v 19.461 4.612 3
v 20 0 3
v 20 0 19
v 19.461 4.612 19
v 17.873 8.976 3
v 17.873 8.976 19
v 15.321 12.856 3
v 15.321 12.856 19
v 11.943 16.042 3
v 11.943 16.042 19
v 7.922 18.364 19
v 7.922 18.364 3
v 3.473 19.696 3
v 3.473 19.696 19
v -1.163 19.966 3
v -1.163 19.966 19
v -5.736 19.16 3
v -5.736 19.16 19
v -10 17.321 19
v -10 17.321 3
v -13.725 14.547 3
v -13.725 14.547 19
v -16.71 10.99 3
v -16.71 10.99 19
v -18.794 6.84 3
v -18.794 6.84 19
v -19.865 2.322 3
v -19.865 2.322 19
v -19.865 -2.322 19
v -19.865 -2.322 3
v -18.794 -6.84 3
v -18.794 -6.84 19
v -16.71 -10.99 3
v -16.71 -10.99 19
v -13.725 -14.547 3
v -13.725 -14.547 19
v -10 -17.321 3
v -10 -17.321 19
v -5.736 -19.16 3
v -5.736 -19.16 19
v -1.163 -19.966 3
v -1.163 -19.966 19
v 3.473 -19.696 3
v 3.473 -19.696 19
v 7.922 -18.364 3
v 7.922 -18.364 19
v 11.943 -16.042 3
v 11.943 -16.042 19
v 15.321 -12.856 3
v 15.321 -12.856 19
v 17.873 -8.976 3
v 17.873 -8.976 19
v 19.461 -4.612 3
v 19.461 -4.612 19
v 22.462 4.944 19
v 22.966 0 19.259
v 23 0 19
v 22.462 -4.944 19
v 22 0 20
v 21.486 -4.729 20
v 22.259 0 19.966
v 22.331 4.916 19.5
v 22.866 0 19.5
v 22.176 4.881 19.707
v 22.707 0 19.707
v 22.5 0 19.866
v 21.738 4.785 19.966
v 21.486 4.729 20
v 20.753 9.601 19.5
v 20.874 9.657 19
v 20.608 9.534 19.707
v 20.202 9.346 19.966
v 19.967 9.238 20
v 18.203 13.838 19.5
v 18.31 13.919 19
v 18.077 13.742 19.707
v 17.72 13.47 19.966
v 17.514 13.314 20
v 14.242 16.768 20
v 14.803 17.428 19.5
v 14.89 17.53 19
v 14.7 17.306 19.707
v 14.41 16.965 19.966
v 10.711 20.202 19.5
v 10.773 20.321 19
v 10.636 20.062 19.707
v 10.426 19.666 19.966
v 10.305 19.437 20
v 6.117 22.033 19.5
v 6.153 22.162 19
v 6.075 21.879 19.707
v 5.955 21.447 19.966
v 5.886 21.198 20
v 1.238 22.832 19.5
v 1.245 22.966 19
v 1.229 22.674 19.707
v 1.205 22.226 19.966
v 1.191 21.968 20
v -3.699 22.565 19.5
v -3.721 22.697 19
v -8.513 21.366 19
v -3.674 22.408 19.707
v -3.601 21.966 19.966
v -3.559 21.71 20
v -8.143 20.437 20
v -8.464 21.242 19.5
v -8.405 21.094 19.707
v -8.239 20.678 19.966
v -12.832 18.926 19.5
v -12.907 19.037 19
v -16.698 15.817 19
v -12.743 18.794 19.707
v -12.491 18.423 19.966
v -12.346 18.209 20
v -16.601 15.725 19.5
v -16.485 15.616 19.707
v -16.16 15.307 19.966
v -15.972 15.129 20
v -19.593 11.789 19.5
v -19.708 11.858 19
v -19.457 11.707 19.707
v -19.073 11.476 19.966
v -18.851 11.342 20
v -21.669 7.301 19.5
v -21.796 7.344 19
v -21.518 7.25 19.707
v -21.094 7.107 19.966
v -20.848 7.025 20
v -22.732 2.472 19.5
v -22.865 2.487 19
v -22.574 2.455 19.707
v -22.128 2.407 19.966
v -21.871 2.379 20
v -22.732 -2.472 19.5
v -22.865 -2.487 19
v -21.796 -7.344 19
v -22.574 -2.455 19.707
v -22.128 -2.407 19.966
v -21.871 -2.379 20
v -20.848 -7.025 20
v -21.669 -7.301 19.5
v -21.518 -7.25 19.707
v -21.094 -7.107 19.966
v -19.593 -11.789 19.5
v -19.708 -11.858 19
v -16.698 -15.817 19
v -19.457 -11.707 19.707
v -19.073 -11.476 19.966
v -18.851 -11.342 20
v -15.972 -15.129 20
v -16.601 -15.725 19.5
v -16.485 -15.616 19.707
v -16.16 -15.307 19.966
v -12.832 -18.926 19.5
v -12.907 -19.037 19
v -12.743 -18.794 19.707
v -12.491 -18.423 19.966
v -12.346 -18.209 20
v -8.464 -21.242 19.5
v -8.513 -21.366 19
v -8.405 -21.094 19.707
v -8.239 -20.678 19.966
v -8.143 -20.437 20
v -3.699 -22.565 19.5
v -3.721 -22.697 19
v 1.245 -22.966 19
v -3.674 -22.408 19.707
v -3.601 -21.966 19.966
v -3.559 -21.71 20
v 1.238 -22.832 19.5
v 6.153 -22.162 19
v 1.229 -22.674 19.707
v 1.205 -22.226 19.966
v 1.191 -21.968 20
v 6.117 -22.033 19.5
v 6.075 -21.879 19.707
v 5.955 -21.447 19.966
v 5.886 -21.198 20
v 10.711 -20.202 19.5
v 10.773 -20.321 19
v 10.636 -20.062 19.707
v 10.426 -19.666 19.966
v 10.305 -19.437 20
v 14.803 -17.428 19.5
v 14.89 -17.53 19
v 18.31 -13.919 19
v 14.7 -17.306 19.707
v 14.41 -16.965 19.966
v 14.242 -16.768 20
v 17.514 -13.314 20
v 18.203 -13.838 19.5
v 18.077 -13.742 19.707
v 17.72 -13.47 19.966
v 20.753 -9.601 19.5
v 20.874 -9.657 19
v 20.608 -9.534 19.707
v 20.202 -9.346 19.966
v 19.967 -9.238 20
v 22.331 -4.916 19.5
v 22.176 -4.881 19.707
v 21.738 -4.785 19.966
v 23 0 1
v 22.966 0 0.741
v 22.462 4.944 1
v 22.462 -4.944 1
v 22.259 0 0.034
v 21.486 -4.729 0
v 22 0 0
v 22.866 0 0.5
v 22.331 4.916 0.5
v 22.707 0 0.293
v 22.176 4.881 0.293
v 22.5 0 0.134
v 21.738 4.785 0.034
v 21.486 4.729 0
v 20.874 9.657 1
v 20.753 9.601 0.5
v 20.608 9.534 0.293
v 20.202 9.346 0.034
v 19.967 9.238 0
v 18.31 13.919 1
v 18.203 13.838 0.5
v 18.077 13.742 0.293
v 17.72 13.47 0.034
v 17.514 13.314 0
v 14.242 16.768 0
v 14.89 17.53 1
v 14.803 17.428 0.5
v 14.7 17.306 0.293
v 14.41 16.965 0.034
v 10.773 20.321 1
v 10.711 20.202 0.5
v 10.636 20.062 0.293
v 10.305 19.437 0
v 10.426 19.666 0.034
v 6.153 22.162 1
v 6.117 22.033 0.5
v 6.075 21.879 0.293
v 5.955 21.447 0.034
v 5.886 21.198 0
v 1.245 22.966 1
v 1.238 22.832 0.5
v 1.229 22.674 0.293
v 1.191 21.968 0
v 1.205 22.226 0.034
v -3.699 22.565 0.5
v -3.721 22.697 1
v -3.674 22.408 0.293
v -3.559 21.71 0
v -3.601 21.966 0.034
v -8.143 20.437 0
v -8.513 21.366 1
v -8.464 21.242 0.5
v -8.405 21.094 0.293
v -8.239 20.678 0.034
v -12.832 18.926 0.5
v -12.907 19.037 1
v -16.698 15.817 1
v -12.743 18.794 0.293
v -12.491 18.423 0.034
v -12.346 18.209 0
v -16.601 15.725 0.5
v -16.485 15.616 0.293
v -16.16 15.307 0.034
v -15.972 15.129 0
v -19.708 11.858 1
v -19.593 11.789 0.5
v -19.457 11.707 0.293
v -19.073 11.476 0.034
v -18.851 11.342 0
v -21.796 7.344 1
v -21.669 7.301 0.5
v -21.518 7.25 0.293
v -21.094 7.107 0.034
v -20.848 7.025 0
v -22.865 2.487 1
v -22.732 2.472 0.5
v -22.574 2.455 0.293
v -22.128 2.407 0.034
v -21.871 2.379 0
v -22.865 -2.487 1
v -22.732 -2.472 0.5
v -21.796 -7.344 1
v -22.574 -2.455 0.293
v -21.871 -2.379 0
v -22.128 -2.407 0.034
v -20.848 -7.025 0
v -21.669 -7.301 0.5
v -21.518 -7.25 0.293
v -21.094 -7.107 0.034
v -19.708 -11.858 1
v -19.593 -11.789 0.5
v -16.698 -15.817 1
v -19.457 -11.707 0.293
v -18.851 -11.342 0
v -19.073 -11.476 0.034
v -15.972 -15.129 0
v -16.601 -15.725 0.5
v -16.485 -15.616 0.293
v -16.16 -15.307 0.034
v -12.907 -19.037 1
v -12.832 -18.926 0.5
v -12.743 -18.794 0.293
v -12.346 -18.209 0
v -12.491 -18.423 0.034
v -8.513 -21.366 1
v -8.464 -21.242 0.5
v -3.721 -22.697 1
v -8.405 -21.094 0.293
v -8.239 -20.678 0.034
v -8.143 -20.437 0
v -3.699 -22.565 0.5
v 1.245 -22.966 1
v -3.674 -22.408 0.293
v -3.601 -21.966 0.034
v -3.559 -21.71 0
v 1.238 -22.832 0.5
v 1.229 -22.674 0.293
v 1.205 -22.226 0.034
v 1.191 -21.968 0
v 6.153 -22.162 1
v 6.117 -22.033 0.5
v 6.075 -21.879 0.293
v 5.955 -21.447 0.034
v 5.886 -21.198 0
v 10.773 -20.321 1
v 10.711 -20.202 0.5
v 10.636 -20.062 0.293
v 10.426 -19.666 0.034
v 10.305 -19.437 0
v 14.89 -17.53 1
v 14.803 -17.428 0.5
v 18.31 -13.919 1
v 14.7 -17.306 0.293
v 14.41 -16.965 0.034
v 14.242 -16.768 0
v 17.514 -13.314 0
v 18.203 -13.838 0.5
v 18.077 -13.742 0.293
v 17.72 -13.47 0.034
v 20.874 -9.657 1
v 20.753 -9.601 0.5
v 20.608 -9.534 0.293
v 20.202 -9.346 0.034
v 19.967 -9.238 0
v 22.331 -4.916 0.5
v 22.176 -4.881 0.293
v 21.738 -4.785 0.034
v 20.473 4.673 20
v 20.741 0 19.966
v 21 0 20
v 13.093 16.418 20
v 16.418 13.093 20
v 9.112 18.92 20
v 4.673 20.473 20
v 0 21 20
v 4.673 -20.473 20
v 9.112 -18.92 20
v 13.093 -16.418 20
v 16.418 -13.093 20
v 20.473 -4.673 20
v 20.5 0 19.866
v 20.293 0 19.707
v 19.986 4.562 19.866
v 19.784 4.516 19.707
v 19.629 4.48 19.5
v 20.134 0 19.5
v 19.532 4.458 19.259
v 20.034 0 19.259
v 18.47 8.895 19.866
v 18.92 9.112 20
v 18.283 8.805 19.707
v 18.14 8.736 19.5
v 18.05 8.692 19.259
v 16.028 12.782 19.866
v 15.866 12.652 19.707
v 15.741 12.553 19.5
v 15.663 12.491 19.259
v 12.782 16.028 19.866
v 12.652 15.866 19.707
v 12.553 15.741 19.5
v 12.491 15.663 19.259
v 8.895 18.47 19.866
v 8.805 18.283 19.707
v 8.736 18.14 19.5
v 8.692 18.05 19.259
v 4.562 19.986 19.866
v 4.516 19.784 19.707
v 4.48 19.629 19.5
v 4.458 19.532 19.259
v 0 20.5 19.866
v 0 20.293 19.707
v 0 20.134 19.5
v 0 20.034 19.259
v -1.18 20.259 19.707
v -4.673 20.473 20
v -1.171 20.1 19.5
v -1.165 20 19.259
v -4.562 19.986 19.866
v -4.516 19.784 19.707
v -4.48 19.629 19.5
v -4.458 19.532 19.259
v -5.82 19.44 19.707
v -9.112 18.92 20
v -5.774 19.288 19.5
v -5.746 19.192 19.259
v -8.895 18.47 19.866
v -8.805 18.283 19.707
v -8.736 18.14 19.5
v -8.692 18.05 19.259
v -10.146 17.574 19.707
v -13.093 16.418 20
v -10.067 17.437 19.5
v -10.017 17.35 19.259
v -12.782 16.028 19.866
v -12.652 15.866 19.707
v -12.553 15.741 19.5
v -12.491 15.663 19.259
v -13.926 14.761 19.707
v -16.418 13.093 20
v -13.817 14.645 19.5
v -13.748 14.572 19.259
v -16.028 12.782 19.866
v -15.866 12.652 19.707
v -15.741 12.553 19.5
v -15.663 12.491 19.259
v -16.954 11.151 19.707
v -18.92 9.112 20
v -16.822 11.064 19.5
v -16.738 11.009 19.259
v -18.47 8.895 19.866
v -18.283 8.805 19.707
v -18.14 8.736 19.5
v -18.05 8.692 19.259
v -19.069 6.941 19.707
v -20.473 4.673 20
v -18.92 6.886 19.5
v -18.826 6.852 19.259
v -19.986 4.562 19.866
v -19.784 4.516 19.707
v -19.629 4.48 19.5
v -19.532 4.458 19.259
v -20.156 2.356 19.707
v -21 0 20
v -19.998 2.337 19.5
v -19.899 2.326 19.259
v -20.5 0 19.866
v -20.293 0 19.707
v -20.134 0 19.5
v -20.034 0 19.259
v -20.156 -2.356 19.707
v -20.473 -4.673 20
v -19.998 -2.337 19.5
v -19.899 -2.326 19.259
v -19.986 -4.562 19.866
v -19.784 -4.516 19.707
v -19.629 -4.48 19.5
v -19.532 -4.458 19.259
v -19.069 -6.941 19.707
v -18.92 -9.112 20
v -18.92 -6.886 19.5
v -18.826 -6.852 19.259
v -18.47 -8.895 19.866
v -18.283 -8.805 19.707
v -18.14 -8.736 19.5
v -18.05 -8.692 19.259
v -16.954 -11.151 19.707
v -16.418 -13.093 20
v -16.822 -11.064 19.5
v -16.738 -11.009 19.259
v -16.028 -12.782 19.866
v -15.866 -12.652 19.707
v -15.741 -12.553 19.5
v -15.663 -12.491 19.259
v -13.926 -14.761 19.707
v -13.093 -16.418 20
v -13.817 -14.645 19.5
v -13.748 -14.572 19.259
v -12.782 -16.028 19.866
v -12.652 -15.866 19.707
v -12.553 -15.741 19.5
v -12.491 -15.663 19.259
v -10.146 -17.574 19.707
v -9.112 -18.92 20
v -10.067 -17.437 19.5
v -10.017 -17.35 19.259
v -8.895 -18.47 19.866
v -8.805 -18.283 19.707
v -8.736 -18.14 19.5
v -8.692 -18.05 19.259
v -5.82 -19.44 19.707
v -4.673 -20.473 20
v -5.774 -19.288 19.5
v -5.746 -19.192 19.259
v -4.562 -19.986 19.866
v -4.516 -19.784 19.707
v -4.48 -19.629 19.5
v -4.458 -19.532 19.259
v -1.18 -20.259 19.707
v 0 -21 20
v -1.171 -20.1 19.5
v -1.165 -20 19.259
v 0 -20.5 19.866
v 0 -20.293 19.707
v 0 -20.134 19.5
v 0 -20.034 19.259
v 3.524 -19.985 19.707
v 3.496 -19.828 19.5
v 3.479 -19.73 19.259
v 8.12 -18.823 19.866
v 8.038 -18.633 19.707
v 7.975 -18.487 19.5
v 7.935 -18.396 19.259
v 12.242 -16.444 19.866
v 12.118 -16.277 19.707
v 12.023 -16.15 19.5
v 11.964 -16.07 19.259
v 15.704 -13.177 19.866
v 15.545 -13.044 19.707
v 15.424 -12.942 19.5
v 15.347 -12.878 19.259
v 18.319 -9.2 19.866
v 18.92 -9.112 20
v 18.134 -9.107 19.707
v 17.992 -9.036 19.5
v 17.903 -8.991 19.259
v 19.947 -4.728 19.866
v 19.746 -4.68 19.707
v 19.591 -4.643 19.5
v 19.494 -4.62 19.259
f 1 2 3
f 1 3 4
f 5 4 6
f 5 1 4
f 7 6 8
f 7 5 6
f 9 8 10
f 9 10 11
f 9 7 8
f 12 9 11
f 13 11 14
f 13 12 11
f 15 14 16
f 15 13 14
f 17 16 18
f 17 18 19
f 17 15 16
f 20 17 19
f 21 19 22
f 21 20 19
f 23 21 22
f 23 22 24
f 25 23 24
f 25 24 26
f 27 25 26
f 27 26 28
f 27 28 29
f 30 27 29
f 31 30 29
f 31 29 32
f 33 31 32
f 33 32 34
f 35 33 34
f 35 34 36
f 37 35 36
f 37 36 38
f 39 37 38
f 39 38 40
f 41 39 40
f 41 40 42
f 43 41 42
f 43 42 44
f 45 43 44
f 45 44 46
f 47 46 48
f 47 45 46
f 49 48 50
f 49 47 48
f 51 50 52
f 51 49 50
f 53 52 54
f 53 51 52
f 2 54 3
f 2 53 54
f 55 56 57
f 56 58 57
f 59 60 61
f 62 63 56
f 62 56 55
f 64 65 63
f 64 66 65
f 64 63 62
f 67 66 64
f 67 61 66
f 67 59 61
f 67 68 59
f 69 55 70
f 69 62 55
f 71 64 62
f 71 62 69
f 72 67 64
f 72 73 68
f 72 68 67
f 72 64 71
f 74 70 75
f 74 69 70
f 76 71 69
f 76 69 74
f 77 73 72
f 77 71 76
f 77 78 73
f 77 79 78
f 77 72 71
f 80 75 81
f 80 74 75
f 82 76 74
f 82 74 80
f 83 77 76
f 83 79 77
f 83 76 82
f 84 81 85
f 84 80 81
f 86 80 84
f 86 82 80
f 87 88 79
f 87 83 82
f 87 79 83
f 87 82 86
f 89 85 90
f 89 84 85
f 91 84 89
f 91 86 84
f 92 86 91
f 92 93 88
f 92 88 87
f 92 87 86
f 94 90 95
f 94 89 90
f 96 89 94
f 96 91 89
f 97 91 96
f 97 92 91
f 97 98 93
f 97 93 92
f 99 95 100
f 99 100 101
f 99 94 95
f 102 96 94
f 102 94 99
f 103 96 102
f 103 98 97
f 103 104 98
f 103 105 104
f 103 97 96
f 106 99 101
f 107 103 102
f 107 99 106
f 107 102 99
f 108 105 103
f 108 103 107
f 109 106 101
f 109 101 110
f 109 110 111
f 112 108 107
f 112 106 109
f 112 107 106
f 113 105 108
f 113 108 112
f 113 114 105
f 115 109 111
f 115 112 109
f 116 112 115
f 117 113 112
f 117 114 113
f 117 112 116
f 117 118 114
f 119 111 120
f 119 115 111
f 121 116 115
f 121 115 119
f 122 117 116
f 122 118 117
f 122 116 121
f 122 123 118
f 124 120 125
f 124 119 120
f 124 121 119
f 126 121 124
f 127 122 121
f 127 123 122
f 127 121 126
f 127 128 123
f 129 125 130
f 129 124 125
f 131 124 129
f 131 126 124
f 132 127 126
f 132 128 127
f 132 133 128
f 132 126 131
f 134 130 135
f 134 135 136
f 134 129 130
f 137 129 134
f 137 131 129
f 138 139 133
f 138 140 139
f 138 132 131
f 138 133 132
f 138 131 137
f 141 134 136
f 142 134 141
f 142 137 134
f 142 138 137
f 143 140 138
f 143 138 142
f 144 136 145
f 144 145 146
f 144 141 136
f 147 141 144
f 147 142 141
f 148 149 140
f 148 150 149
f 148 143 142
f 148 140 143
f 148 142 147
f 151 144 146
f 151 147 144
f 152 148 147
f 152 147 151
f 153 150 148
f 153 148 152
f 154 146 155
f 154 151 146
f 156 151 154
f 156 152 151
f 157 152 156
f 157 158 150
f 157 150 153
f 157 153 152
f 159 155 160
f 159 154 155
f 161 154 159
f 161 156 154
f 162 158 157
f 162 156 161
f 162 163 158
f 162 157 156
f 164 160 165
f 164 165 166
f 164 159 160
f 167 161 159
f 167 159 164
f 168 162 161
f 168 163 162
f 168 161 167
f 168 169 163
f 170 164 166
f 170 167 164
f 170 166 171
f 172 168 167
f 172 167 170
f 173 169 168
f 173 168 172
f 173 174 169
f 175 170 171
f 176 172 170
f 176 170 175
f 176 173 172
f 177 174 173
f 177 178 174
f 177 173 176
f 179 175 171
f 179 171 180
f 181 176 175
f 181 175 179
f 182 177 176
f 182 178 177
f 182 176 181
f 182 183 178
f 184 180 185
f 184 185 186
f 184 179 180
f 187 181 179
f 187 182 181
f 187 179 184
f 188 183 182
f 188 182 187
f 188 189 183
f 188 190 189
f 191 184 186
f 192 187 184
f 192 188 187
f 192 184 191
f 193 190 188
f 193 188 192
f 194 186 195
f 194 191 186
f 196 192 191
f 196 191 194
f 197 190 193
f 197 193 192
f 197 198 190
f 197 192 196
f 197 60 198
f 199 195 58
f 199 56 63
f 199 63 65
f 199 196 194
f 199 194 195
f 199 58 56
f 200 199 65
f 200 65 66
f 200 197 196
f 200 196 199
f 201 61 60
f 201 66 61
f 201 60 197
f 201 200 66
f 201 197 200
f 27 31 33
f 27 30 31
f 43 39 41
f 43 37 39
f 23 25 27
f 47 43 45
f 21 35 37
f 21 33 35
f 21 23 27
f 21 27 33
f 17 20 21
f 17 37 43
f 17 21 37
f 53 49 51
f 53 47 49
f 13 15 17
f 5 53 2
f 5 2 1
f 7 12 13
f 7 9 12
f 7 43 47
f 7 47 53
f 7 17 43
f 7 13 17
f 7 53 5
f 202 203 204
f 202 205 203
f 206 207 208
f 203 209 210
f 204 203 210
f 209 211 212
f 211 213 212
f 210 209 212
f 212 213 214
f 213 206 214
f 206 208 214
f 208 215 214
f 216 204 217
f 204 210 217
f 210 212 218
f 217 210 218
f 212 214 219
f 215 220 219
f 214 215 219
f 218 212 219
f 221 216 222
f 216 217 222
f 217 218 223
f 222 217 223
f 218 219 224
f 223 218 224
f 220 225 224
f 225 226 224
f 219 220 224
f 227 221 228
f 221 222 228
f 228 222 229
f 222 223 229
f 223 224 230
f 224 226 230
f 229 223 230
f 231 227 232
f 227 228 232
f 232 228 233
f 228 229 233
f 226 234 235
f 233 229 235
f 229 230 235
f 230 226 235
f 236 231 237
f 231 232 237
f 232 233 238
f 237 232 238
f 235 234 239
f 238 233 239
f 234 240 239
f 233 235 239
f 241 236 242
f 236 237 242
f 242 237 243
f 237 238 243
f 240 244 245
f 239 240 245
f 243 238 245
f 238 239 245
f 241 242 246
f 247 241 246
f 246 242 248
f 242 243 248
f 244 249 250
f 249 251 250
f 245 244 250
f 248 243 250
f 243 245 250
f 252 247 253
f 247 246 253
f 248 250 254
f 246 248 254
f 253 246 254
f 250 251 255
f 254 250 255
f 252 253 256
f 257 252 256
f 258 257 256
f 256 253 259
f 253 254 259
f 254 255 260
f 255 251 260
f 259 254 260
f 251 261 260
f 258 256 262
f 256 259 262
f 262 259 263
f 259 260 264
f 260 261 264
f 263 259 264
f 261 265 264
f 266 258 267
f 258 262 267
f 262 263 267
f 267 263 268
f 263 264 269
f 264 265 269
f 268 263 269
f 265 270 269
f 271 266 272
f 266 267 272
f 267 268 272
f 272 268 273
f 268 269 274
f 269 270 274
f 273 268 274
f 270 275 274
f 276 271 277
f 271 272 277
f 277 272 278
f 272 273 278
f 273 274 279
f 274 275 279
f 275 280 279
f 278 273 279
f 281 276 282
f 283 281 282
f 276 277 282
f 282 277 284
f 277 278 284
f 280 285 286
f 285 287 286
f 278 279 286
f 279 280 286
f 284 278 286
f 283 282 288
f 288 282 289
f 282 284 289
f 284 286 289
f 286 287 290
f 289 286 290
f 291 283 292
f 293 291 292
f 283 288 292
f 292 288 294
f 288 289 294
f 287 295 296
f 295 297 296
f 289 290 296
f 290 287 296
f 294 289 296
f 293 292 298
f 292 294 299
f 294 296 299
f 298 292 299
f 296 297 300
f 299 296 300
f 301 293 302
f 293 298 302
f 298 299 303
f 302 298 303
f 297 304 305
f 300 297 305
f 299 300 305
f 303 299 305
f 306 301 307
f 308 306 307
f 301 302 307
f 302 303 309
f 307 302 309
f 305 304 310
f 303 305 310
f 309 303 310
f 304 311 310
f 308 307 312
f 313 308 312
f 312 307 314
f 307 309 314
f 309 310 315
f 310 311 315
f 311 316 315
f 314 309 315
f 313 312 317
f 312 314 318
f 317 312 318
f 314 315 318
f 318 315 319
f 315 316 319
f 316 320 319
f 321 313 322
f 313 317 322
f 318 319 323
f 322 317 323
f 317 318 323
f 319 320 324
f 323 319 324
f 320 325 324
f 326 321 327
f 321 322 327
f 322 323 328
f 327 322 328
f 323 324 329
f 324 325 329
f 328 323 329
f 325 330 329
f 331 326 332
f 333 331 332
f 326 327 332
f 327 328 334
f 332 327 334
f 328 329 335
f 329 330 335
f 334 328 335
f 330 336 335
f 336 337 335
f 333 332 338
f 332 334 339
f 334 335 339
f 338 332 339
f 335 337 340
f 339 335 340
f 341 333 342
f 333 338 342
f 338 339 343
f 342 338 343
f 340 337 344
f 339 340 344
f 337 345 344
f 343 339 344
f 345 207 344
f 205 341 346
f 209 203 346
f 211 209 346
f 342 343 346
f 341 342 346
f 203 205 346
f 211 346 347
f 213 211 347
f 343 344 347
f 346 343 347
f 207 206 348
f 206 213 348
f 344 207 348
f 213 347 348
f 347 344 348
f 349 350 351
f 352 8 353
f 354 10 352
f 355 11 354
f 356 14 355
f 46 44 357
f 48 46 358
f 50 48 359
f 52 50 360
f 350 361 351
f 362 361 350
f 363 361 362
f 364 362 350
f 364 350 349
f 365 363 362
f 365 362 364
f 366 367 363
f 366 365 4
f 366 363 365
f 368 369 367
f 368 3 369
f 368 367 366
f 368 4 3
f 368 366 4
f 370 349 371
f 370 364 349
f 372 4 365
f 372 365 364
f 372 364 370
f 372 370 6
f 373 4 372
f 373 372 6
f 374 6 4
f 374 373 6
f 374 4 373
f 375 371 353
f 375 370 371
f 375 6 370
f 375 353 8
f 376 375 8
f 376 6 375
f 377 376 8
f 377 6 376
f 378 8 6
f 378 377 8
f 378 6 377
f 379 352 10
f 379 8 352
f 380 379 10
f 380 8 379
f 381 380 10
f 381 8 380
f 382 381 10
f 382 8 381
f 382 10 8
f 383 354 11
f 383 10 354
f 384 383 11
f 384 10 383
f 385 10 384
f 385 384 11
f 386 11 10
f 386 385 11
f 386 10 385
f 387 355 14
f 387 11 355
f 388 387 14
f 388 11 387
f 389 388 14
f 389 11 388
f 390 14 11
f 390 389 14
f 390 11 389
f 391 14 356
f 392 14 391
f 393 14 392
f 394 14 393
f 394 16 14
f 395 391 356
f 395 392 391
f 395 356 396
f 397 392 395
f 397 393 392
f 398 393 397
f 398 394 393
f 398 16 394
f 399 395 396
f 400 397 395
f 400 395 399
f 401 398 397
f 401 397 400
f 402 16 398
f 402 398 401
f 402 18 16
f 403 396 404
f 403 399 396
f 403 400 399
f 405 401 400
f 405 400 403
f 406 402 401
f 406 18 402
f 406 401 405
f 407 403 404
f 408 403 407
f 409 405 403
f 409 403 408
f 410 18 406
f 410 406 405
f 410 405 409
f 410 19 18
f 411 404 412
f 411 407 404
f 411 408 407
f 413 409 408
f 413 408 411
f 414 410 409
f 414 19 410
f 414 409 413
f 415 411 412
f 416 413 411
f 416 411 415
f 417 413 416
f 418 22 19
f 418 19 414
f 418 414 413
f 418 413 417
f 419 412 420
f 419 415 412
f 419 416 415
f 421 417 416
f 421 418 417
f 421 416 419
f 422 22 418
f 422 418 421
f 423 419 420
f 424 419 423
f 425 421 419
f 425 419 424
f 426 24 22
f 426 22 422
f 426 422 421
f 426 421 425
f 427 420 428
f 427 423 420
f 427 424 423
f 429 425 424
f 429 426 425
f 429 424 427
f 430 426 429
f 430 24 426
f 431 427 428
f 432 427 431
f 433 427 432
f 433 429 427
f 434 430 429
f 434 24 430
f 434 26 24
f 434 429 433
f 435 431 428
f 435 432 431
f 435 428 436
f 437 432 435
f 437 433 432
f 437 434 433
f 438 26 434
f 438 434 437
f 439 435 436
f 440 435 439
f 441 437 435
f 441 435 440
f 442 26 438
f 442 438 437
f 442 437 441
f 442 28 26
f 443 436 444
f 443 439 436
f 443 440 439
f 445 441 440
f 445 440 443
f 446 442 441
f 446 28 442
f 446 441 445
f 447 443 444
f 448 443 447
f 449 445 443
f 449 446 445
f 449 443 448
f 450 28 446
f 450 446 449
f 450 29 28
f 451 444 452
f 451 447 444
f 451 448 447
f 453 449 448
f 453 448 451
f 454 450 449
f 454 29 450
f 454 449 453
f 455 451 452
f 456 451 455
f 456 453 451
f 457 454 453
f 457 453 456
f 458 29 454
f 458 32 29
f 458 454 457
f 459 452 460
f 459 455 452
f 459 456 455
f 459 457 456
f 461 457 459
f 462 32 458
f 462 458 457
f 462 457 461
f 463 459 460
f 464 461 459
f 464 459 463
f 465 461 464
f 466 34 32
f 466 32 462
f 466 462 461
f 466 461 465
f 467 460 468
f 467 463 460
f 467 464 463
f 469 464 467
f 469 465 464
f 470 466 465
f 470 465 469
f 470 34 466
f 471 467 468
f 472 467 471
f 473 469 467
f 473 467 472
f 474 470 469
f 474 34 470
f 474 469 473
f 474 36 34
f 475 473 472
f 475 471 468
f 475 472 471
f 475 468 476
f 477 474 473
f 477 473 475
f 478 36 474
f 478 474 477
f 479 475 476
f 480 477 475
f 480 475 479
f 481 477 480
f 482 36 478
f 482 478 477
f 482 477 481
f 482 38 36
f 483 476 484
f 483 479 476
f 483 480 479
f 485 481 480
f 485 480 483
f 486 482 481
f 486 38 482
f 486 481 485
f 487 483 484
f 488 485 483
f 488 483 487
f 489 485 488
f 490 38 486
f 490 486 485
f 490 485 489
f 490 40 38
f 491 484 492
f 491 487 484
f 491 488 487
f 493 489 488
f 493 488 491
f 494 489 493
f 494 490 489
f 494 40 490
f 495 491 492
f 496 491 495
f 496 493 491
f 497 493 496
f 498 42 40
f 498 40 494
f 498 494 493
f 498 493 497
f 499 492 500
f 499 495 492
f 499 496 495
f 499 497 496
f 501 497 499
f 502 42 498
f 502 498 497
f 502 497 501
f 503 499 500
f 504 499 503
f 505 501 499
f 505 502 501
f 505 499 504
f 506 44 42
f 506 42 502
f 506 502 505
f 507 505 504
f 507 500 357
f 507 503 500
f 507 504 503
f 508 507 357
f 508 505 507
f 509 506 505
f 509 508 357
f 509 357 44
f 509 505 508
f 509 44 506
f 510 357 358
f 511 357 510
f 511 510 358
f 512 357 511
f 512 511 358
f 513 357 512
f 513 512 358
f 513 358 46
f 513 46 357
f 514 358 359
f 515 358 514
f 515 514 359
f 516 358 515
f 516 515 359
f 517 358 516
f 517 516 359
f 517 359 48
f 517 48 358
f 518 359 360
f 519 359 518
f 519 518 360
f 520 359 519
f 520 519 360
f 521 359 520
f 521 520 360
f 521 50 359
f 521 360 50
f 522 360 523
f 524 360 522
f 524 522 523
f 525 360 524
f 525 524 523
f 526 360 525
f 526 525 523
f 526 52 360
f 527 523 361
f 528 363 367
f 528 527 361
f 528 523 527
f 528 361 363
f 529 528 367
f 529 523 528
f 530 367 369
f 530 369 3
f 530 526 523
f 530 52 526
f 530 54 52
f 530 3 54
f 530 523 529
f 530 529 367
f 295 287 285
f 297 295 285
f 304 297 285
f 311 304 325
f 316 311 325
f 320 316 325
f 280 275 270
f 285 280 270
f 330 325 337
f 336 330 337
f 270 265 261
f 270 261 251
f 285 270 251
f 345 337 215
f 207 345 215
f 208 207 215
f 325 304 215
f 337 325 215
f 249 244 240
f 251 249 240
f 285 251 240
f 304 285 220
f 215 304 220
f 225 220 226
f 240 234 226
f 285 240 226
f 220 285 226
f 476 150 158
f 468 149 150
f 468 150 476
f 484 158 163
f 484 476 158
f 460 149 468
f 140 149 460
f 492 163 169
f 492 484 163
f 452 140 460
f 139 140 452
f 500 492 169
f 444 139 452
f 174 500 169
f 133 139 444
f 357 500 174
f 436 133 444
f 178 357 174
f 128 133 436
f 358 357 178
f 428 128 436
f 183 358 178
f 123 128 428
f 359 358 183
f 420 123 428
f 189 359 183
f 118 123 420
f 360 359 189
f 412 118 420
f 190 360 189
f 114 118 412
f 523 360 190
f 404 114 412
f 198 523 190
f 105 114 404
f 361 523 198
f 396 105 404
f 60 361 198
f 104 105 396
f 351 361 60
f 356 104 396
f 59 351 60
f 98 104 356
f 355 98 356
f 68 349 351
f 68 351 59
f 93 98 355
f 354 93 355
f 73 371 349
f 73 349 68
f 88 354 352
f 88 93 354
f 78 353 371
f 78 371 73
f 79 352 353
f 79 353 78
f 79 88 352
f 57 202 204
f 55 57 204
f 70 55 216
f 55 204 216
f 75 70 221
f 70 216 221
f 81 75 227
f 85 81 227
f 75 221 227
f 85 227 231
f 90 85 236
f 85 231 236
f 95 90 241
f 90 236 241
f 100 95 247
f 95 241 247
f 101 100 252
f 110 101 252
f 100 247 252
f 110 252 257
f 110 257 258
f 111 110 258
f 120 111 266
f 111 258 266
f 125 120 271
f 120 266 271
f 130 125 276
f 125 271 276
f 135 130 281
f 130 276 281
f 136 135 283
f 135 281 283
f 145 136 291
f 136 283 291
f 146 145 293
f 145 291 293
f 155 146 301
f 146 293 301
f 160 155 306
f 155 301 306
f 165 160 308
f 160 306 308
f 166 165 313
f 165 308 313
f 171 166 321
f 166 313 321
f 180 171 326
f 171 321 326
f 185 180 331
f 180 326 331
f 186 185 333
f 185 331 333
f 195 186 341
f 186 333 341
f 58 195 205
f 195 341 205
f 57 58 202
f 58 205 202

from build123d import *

# Parameters (mm, degrees)
F0_R     = 23
F0_R_2   = 20
F1_DEPTH = 20
F2_R     = 23
F3_DEPTH = 3
F4_R     = 1


with BuildPart() as f1:
    # F0 (on Top) → F1 (new body)
    with BuildSketch(Plane.XY):
        Circle(F0_R)
        Circle(F0_R_2, mode=Mode.SUBTRACT)
    extrude(amount=F1_DEPTH)

    # F2 (on Top) → F3 (join)
    with BuildSketch(Plane.XY):
        Circle(F2_R)
    extrude(amount=F3_DEPTH)

    # F4
    f4_edges = [f1.edges().sort_by_distance(p)[0] for p in [
        (-20, 0, 20),
        (-23, 0, 20),
        (-23, 0, 0),
    ]]
    fillet(f4_edges, radius=F4_R)


solid = f1.part
